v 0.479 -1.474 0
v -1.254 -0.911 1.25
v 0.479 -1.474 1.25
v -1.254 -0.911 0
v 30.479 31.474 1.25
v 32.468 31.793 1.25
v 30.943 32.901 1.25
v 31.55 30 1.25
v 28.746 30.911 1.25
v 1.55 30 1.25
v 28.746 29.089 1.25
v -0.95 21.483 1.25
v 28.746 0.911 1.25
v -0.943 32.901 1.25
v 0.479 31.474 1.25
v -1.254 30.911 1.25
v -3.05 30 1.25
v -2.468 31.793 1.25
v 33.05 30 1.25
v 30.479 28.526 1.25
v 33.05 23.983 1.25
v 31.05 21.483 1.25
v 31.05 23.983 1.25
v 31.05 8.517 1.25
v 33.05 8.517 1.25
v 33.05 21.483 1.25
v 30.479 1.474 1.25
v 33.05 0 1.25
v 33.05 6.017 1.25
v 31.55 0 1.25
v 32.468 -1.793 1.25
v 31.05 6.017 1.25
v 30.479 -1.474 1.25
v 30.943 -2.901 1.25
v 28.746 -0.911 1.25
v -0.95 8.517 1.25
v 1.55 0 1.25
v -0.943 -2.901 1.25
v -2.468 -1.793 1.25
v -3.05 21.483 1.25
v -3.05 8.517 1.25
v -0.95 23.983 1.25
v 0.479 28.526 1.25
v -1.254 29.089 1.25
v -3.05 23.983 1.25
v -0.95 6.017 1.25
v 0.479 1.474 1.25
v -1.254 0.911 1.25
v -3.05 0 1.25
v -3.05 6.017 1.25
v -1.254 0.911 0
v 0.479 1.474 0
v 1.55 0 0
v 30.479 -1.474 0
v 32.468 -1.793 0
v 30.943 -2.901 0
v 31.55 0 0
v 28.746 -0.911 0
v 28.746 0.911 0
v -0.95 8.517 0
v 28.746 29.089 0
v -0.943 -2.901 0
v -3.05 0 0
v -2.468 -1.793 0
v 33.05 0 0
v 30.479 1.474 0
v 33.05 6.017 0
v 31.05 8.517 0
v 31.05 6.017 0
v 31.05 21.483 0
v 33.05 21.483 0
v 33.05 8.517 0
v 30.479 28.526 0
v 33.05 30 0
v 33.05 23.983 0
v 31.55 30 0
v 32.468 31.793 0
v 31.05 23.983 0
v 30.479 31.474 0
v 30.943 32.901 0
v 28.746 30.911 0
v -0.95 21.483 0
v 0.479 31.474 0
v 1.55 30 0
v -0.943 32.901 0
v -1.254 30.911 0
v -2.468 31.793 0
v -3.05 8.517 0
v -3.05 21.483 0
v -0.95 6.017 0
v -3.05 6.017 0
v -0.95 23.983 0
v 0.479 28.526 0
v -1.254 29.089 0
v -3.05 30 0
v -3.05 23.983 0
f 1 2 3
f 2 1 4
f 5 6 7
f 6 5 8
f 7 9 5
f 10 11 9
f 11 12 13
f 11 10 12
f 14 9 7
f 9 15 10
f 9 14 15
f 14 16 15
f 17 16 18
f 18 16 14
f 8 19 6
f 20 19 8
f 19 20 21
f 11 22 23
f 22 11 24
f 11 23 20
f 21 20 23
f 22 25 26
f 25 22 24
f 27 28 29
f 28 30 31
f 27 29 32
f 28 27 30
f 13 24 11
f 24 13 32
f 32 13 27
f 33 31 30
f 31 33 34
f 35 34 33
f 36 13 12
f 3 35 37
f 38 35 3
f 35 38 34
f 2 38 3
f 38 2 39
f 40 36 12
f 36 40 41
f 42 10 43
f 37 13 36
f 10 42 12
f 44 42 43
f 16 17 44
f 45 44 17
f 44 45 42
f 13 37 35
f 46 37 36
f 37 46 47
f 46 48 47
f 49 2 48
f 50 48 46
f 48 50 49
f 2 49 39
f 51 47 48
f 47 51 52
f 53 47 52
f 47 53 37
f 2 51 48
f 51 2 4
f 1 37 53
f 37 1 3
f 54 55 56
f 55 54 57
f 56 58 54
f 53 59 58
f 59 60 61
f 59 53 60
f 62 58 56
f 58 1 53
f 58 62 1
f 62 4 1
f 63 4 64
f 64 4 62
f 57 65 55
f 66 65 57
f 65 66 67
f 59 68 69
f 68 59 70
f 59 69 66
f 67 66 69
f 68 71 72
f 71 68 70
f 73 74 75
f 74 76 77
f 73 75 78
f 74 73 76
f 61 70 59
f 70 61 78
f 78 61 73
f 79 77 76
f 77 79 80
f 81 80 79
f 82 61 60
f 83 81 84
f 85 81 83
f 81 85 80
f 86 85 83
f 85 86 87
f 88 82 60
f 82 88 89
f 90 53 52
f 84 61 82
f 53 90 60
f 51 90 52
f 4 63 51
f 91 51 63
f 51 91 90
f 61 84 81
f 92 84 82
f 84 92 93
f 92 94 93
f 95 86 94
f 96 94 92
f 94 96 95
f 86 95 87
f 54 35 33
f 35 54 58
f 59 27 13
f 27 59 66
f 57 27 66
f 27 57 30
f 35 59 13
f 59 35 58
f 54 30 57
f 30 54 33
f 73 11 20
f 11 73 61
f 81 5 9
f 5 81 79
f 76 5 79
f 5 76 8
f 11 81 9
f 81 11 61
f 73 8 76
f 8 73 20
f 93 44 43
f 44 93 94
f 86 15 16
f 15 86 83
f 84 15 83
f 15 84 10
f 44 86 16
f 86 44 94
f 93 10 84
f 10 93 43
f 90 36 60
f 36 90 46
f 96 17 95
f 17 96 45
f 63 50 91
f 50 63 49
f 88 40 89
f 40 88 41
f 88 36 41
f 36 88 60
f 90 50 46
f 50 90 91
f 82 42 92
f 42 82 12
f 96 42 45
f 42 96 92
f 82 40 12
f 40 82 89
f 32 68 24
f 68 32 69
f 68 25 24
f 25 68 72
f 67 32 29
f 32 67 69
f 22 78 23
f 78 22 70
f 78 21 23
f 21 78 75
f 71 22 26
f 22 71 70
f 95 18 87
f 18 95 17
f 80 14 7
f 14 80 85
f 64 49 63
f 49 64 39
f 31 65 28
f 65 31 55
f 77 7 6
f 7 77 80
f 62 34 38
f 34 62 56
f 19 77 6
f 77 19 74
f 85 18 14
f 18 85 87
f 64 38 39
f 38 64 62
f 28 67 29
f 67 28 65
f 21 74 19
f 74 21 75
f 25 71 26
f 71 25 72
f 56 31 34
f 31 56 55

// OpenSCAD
/* Parametric Quadcopter Stack Shelf by briancmoses */

// What is your quadcopter's electronics stack layout??
layout=30; // [20:20x20mm, 30:30x30mm]

// How thick do you want the shelf stack to be?
shelf_height=1.25;

// What is the diameter of your stand-off's thread(M2=2mm, M3=3mm)?
standoff_thread_diameter=3;

// Do you want notches created for zip ties?
zip_tie_notch=true; //[true:Yes, false: No

//What is your zip tie's width in mm?
zip_tie_width=2.4;

//What is your zip tie's height in mm?
zip_tie_height=1.0;

/* [Hidden] */
padding=3;
modified_standoff_thread_diameter=(standoff_thread_diameter + .1);
modified_zip_tie_width=(zip_tie_width + .1);
modified_zip_tie_height=(zip_tie_height * 2);

stackshelf(layout);

module stackshelf(lo){
    difference(){
        hull(){
            translate([0,0,0]) cylinder(h=shelf_height, d=modified_standoff_thread_diameter+padding);
            translate([lo,0,0]) cylinder(h=shelf_height, d=modified_standoff_thread_diameter+padding);
            translate([lo,lo,0]) cylinder(h=shelf_height, d=modified_standoff_thread_diameter+padding);
            translate([0,lo,0]) cylinder(h=shelf_height, d=modified_standoff_thread_diameter+padding);
        }
        standoff_thread_holes(shelf_height, modified_standoff_thread_diameter, lo);
        if (zip_tie_notch==true) ziptie_notches(modified_zip_tie_height, modified_zip_tie_width, lo, padding, shelf_height, modified_standoff_thread_diameter);
    }
}

module standoff_thread_holes(so_height, so_diameter, so_layout){
    translate([0,0,0]) cylinder(h=so_height, d=so_diameter);
    translate([so_layout,0,0]) cylinder(h=so_height, d=so_diameter);
    translate([so_layout,so_layout,0]) cylinder(h=so_height, d=so_diameter);
    translate([0,so_layout,0]) cylinder(h=so_height, d=so_diameter);
}


module ziptie_notches(zt_height, zt_width, lo_zn, pad, sh_height, so_diameter){
    hull_x =((so_diameter+pad)/2) + lo_zn + ((so_diameter+pad)/2);
    hull_y =((so_diameter+pad)/2) + lo_zn + ((so_diameter+pad)/2);
    so_radius=((so_diameter+pad)/2);
    translate([-so_radius,hull_y/6,-10]) cube([zt_height*1.05,zt_width,20]);
    translate([-so_radius,(lo_zn-(hull_y/6)-zt_width),-10]) cube([zt_height*1.05,zt_width,20]);
    translate([hull_x-so_radius-zt_height,hull_y/6,-10]) cube([zt_height*1.05,zt_width,20]);
    translate([hull_x-so_radius-zt_height,(lo_zn-(hull_y/6)-zt_width),-10]) cube([zt_height*1.05,zt_width,20]);
}
